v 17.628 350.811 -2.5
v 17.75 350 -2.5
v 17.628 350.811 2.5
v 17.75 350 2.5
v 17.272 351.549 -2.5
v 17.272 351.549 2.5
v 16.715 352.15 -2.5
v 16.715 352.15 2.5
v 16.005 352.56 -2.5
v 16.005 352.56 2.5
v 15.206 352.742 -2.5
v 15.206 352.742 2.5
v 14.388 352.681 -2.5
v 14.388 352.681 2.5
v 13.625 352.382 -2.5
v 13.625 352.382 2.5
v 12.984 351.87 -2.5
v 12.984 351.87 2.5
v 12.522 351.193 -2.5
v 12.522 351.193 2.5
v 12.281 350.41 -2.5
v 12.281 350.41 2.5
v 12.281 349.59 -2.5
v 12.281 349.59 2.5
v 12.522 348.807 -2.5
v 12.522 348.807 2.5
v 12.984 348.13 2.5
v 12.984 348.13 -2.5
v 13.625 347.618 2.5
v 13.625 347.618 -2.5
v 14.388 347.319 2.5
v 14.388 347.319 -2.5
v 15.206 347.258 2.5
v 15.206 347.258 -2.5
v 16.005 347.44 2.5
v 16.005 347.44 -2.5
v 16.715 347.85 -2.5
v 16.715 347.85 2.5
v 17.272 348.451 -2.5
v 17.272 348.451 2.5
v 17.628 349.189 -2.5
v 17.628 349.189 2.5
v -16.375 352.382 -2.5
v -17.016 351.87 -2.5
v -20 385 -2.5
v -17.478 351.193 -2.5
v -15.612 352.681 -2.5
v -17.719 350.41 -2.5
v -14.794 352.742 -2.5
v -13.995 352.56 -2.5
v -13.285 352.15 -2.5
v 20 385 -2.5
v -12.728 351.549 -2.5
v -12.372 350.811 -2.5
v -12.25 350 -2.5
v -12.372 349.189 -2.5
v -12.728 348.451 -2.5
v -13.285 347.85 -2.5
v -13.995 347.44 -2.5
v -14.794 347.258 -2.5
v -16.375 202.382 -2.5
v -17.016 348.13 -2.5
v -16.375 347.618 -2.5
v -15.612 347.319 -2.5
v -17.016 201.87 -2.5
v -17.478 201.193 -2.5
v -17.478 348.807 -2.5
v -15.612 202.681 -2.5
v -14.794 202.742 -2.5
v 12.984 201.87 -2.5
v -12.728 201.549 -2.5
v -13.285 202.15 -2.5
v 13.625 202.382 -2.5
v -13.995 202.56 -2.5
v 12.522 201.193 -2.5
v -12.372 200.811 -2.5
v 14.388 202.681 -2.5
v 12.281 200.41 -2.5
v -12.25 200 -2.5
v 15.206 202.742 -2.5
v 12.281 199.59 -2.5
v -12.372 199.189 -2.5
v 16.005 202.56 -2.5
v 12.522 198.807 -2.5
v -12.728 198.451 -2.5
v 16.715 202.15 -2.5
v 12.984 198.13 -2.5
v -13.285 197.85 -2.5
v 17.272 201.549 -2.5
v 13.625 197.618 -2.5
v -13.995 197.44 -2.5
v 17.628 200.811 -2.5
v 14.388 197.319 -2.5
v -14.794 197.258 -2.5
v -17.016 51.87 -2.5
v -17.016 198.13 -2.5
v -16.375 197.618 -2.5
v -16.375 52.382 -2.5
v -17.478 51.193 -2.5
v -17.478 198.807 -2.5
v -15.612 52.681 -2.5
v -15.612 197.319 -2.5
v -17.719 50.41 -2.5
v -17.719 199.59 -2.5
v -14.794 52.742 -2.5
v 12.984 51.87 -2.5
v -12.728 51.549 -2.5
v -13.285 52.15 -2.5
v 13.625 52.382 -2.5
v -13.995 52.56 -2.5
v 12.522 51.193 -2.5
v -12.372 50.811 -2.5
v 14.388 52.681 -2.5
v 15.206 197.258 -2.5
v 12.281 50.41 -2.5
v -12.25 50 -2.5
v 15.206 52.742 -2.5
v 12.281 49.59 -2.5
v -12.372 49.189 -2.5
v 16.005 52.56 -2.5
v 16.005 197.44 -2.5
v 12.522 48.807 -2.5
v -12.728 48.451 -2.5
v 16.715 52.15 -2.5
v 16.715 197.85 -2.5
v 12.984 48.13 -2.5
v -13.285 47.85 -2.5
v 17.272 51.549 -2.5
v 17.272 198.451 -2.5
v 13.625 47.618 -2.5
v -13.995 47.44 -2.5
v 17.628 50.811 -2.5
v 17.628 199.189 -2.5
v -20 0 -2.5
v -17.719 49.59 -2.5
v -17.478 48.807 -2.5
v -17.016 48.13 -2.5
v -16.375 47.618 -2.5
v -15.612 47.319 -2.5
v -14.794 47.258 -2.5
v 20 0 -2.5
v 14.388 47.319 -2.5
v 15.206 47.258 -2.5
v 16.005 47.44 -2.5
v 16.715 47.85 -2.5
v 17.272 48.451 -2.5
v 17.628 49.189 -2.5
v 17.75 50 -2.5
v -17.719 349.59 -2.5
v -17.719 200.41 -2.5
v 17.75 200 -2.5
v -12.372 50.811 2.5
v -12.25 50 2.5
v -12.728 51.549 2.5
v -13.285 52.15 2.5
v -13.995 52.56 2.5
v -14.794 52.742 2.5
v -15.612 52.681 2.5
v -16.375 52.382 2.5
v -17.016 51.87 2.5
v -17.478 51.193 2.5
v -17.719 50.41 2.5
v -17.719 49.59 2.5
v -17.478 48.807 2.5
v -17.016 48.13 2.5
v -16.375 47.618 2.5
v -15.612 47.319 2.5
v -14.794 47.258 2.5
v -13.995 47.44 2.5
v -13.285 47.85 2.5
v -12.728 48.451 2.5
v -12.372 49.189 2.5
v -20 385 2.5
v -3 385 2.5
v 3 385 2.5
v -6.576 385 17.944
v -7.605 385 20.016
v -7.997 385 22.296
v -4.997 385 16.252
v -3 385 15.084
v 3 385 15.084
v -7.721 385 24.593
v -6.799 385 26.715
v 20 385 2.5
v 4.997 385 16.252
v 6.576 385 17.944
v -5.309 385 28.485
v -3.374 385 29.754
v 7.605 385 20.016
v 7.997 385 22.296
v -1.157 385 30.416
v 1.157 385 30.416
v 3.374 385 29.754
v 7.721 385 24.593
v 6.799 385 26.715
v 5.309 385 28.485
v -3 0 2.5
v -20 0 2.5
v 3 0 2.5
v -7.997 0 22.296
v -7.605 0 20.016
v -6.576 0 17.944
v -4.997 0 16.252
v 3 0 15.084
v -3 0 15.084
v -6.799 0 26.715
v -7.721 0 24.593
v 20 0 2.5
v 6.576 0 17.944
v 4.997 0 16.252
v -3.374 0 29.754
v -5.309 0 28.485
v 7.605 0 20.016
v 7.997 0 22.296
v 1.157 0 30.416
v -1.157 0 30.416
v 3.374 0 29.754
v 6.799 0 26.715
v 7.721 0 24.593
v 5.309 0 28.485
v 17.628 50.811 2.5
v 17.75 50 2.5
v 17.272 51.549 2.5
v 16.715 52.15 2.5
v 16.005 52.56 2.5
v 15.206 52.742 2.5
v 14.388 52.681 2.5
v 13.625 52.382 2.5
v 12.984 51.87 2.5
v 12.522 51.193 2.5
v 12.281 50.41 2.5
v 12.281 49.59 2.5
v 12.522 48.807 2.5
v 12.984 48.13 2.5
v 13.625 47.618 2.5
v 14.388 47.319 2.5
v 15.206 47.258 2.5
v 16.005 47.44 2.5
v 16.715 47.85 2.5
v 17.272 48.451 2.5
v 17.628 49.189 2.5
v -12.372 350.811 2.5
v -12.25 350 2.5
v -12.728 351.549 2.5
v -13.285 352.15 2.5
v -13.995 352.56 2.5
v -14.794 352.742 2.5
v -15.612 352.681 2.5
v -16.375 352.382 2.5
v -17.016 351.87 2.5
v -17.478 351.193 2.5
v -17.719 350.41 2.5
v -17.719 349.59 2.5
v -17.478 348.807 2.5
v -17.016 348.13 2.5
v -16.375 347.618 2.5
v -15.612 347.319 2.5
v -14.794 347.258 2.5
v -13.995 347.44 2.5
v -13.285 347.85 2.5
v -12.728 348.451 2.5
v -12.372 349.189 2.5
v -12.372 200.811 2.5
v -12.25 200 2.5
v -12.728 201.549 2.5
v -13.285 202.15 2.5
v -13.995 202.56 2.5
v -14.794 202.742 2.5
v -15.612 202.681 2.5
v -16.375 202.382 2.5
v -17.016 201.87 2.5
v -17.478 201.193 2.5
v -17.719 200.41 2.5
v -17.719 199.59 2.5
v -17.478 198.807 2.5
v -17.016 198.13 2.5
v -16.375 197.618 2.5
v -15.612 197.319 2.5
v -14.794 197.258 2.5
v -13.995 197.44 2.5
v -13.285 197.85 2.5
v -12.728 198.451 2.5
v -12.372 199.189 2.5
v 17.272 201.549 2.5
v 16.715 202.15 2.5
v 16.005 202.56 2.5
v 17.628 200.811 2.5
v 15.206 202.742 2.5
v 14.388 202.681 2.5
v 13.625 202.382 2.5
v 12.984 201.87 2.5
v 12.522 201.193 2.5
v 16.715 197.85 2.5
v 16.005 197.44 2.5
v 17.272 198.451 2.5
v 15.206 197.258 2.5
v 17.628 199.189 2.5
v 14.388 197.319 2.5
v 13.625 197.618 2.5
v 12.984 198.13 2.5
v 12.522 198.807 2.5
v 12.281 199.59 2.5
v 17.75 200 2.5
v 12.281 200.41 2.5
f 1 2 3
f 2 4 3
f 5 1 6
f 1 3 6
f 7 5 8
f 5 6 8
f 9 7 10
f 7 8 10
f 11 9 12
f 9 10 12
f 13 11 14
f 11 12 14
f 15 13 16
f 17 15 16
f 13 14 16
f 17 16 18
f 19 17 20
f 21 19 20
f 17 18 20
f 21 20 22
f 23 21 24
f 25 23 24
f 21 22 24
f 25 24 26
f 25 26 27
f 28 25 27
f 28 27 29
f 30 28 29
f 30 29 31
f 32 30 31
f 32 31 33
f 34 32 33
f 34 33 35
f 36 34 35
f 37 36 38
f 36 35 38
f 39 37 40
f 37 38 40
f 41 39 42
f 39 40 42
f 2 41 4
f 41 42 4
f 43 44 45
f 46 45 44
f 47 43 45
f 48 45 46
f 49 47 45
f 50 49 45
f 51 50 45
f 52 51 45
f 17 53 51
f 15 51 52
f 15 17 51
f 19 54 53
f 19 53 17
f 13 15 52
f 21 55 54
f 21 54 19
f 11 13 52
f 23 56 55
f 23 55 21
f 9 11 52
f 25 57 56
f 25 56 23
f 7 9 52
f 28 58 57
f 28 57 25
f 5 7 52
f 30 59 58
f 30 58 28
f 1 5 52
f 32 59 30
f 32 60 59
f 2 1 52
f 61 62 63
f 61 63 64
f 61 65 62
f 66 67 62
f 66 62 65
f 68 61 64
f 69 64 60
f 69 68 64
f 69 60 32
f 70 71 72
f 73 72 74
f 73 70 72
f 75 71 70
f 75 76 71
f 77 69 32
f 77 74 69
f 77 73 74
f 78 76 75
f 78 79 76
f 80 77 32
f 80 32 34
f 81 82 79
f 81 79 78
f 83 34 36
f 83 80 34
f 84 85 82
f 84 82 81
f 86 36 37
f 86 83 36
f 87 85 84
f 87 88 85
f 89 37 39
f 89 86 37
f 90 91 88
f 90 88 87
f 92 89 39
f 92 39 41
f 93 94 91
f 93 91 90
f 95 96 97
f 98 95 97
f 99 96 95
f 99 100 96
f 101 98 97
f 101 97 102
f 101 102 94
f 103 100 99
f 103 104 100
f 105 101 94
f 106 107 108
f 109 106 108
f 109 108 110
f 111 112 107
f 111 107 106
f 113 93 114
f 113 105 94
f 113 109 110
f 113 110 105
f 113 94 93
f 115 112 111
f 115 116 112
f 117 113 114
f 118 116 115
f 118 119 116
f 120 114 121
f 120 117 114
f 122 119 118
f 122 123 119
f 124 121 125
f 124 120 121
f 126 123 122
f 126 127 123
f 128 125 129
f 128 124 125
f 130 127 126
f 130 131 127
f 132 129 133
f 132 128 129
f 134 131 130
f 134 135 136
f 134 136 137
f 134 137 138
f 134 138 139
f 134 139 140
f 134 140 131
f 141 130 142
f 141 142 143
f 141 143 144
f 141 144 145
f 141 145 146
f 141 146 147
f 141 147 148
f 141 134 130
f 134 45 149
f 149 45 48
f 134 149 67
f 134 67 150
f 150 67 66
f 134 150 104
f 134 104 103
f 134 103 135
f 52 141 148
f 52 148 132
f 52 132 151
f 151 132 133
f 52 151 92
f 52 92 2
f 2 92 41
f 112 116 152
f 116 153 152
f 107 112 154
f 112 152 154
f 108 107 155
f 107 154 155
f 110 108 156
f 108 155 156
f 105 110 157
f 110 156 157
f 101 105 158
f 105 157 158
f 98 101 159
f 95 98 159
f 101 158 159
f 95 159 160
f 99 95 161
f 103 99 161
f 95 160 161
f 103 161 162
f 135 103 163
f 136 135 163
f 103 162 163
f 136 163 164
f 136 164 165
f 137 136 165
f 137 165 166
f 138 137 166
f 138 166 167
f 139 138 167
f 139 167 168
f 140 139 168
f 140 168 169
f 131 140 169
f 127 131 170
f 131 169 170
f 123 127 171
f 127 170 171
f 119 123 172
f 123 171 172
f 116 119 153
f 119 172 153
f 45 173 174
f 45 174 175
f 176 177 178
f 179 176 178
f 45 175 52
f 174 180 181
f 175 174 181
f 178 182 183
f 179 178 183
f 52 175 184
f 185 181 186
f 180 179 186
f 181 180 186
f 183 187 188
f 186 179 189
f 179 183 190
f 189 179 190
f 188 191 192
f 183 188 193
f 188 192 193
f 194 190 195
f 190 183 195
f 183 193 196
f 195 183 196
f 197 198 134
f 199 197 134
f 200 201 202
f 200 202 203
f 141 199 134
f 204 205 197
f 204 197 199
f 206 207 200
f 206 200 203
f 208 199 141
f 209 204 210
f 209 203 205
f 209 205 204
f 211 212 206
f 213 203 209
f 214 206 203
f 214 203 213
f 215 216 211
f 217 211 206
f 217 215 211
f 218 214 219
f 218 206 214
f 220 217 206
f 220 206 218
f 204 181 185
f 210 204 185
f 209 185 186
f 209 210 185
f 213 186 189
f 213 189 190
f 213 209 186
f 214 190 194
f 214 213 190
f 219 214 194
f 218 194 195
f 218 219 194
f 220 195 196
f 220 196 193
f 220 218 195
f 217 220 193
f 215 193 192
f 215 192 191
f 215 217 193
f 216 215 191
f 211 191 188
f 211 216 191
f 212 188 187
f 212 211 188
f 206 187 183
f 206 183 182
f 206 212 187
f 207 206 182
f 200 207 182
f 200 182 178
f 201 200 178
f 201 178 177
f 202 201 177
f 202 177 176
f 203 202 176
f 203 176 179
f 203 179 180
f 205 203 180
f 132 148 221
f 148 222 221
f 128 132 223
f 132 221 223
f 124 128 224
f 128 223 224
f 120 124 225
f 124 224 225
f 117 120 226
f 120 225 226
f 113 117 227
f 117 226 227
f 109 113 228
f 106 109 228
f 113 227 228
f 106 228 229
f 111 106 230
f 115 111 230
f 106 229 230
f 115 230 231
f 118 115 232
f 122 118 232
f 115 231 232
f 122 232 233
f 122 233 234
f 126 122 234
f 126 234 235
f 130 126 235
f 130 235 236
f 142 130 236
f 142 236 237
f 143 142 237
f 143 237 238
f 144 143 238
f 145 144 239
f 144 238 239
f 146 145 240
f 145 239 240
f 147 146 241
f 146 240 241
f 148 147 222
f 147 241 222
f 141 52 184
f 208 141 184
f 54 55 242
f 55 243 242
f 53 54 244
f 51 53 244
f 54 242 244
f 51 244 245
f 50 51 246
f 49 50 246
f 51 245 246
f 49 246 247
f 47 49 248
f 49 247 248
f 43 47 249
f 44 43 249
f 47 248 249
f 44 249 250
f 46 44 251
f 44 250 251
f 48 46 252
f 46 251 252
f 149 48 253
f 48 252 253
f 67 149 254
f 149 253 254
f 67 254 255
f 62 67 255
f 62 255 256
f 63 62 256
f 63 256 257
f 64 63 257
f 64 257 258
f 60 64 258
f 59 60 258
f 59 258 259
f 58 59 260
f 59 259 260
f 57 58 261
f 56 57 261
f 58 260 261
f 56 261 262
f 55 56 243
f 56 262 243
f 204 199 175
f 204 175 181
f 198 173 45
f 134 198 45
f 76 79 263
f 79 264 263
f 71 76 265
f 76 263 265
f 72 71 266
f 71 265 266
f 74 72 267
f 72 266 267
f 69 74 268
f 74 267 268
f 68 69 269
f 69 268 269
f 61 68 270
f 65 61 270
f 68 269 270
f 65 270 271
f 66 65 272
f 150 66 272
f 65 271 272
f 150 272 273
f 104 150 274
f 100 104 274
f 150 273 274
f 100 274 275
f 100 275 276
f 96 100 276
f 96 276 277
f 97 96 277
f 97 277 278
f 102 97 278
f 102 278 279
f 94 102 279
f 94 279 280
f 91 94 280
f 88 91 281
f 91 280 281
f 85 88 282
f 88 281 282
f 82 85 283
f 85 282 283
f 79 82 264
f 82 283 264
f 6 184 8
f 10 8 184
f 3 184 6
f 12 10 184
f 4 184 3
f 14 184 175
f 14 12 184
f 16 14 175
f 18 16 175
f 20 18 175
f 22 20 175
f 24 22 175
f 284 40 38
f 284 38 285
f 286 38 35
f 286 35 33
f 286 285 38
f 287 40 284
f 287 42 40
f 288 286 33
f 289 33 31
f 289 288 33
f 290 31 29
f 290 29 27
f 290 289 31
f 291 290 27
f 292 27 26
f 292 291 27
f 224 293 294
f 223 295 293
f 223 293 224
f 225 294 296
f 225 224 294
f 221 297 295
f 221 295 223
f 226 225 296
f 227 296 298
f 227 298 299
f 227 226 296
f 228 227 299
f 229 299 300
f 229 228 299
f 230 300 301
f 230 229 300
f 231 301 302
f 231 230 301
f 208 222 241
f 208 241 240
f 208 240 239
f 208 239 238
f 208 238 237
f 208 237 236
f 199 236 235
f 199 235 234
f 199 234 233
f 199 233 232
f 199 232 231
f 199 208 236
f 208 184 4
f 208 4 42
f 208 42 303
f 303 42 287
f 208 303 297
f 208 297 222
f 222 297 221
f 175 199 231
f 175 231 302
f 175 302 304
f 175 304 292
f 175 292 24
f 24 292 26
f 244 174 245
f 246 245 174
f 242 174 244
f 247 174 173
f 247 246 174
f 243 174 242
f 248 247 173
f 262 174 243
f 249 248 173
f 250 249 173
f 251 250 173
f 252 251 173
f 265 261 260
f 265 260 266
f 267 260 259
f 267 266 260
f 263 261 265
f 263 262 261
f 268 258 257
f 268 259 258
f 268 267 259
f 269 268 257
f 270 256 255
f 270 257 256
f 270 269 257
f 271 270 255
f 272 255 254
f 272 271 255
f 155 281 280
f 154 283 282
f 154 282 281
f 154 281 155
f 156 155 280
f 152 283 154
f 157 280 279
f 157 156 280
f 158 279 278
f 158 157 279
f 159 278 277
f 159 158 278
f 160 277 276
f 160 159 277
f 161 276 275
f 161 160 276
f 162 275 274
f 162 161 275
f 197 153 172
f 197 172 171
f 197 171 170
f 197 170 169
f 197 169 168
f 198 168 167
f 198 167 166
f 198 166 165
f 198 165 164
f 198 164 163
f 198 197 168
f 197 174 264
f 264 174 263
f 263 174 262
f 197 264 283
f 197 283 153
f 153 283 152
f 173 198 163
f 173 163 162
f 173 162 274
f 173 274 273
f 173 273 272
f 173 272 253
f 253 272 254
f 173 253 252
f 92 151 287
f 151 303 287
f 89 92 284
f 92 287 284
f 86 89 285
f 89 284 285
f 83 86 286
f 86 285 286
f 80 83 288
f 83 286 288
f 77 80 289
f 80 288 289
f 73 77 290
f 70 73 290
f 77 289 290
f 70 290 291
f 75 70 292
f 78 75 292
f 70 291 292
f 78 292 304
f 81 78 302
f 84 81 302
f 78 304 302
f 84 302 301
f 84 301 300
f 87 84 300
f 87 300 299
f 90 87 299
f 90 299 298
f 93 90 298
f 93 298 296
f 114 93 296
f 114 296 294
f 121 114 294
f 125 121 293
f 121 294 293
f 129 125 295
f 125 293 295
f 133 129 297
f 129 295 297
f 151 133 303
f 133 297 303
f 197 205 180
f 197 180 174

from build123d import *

# Parameters (mm, degrees)
F2_DEPTH = 385
F1_R     = 2.75
F3_DEPTH = 2.75


with BuildPart() as f2:
    # F0 (on Front) → F2 (new body)
    with BuildSketch(Plane.XZ):
        with BuildLine():
            Line((20, -2.5), (20, 2.5))
            Line((20, 2.5), (3, 2.5))
            Line((3, 2.5), (3, 15.0838015129))
            ThreePointArc((3, 15.0838015129), (0, 30.5), (-3, 15.0838015129))
            Line((-3, 15.0838015129), (-3, 2.5))
            Line((-3, 2.5), (-20, 2.5))
            Line((-20, 2.5), (-20, -2.5))
            Line((-20, -2.5), (20, -2.5))
        make_face()
    extrude(amount=-F2_DEPTH)

    # F1 (on Top) → F3 (cut, symmetric)
    with BuildSketch(Plane.XY):
        with Locations((15, 50)):
            Circle(F1_R)
        with Locations((15, 200)):
            Circle(F1_R)
        with Locations((15, 350)):
            Circle(F1_R)
        with Locations((-15, 50)):
            Circle(F1_R)
        with Locations((-15, 200)):
            Circle(F1_R)
        with Locations((-15, 350)):
            Circle(F1_R)
    extrude(amount=F3_DEPTH, both=True, mode=Mode.SUBTRACT)


solid = f2.part
